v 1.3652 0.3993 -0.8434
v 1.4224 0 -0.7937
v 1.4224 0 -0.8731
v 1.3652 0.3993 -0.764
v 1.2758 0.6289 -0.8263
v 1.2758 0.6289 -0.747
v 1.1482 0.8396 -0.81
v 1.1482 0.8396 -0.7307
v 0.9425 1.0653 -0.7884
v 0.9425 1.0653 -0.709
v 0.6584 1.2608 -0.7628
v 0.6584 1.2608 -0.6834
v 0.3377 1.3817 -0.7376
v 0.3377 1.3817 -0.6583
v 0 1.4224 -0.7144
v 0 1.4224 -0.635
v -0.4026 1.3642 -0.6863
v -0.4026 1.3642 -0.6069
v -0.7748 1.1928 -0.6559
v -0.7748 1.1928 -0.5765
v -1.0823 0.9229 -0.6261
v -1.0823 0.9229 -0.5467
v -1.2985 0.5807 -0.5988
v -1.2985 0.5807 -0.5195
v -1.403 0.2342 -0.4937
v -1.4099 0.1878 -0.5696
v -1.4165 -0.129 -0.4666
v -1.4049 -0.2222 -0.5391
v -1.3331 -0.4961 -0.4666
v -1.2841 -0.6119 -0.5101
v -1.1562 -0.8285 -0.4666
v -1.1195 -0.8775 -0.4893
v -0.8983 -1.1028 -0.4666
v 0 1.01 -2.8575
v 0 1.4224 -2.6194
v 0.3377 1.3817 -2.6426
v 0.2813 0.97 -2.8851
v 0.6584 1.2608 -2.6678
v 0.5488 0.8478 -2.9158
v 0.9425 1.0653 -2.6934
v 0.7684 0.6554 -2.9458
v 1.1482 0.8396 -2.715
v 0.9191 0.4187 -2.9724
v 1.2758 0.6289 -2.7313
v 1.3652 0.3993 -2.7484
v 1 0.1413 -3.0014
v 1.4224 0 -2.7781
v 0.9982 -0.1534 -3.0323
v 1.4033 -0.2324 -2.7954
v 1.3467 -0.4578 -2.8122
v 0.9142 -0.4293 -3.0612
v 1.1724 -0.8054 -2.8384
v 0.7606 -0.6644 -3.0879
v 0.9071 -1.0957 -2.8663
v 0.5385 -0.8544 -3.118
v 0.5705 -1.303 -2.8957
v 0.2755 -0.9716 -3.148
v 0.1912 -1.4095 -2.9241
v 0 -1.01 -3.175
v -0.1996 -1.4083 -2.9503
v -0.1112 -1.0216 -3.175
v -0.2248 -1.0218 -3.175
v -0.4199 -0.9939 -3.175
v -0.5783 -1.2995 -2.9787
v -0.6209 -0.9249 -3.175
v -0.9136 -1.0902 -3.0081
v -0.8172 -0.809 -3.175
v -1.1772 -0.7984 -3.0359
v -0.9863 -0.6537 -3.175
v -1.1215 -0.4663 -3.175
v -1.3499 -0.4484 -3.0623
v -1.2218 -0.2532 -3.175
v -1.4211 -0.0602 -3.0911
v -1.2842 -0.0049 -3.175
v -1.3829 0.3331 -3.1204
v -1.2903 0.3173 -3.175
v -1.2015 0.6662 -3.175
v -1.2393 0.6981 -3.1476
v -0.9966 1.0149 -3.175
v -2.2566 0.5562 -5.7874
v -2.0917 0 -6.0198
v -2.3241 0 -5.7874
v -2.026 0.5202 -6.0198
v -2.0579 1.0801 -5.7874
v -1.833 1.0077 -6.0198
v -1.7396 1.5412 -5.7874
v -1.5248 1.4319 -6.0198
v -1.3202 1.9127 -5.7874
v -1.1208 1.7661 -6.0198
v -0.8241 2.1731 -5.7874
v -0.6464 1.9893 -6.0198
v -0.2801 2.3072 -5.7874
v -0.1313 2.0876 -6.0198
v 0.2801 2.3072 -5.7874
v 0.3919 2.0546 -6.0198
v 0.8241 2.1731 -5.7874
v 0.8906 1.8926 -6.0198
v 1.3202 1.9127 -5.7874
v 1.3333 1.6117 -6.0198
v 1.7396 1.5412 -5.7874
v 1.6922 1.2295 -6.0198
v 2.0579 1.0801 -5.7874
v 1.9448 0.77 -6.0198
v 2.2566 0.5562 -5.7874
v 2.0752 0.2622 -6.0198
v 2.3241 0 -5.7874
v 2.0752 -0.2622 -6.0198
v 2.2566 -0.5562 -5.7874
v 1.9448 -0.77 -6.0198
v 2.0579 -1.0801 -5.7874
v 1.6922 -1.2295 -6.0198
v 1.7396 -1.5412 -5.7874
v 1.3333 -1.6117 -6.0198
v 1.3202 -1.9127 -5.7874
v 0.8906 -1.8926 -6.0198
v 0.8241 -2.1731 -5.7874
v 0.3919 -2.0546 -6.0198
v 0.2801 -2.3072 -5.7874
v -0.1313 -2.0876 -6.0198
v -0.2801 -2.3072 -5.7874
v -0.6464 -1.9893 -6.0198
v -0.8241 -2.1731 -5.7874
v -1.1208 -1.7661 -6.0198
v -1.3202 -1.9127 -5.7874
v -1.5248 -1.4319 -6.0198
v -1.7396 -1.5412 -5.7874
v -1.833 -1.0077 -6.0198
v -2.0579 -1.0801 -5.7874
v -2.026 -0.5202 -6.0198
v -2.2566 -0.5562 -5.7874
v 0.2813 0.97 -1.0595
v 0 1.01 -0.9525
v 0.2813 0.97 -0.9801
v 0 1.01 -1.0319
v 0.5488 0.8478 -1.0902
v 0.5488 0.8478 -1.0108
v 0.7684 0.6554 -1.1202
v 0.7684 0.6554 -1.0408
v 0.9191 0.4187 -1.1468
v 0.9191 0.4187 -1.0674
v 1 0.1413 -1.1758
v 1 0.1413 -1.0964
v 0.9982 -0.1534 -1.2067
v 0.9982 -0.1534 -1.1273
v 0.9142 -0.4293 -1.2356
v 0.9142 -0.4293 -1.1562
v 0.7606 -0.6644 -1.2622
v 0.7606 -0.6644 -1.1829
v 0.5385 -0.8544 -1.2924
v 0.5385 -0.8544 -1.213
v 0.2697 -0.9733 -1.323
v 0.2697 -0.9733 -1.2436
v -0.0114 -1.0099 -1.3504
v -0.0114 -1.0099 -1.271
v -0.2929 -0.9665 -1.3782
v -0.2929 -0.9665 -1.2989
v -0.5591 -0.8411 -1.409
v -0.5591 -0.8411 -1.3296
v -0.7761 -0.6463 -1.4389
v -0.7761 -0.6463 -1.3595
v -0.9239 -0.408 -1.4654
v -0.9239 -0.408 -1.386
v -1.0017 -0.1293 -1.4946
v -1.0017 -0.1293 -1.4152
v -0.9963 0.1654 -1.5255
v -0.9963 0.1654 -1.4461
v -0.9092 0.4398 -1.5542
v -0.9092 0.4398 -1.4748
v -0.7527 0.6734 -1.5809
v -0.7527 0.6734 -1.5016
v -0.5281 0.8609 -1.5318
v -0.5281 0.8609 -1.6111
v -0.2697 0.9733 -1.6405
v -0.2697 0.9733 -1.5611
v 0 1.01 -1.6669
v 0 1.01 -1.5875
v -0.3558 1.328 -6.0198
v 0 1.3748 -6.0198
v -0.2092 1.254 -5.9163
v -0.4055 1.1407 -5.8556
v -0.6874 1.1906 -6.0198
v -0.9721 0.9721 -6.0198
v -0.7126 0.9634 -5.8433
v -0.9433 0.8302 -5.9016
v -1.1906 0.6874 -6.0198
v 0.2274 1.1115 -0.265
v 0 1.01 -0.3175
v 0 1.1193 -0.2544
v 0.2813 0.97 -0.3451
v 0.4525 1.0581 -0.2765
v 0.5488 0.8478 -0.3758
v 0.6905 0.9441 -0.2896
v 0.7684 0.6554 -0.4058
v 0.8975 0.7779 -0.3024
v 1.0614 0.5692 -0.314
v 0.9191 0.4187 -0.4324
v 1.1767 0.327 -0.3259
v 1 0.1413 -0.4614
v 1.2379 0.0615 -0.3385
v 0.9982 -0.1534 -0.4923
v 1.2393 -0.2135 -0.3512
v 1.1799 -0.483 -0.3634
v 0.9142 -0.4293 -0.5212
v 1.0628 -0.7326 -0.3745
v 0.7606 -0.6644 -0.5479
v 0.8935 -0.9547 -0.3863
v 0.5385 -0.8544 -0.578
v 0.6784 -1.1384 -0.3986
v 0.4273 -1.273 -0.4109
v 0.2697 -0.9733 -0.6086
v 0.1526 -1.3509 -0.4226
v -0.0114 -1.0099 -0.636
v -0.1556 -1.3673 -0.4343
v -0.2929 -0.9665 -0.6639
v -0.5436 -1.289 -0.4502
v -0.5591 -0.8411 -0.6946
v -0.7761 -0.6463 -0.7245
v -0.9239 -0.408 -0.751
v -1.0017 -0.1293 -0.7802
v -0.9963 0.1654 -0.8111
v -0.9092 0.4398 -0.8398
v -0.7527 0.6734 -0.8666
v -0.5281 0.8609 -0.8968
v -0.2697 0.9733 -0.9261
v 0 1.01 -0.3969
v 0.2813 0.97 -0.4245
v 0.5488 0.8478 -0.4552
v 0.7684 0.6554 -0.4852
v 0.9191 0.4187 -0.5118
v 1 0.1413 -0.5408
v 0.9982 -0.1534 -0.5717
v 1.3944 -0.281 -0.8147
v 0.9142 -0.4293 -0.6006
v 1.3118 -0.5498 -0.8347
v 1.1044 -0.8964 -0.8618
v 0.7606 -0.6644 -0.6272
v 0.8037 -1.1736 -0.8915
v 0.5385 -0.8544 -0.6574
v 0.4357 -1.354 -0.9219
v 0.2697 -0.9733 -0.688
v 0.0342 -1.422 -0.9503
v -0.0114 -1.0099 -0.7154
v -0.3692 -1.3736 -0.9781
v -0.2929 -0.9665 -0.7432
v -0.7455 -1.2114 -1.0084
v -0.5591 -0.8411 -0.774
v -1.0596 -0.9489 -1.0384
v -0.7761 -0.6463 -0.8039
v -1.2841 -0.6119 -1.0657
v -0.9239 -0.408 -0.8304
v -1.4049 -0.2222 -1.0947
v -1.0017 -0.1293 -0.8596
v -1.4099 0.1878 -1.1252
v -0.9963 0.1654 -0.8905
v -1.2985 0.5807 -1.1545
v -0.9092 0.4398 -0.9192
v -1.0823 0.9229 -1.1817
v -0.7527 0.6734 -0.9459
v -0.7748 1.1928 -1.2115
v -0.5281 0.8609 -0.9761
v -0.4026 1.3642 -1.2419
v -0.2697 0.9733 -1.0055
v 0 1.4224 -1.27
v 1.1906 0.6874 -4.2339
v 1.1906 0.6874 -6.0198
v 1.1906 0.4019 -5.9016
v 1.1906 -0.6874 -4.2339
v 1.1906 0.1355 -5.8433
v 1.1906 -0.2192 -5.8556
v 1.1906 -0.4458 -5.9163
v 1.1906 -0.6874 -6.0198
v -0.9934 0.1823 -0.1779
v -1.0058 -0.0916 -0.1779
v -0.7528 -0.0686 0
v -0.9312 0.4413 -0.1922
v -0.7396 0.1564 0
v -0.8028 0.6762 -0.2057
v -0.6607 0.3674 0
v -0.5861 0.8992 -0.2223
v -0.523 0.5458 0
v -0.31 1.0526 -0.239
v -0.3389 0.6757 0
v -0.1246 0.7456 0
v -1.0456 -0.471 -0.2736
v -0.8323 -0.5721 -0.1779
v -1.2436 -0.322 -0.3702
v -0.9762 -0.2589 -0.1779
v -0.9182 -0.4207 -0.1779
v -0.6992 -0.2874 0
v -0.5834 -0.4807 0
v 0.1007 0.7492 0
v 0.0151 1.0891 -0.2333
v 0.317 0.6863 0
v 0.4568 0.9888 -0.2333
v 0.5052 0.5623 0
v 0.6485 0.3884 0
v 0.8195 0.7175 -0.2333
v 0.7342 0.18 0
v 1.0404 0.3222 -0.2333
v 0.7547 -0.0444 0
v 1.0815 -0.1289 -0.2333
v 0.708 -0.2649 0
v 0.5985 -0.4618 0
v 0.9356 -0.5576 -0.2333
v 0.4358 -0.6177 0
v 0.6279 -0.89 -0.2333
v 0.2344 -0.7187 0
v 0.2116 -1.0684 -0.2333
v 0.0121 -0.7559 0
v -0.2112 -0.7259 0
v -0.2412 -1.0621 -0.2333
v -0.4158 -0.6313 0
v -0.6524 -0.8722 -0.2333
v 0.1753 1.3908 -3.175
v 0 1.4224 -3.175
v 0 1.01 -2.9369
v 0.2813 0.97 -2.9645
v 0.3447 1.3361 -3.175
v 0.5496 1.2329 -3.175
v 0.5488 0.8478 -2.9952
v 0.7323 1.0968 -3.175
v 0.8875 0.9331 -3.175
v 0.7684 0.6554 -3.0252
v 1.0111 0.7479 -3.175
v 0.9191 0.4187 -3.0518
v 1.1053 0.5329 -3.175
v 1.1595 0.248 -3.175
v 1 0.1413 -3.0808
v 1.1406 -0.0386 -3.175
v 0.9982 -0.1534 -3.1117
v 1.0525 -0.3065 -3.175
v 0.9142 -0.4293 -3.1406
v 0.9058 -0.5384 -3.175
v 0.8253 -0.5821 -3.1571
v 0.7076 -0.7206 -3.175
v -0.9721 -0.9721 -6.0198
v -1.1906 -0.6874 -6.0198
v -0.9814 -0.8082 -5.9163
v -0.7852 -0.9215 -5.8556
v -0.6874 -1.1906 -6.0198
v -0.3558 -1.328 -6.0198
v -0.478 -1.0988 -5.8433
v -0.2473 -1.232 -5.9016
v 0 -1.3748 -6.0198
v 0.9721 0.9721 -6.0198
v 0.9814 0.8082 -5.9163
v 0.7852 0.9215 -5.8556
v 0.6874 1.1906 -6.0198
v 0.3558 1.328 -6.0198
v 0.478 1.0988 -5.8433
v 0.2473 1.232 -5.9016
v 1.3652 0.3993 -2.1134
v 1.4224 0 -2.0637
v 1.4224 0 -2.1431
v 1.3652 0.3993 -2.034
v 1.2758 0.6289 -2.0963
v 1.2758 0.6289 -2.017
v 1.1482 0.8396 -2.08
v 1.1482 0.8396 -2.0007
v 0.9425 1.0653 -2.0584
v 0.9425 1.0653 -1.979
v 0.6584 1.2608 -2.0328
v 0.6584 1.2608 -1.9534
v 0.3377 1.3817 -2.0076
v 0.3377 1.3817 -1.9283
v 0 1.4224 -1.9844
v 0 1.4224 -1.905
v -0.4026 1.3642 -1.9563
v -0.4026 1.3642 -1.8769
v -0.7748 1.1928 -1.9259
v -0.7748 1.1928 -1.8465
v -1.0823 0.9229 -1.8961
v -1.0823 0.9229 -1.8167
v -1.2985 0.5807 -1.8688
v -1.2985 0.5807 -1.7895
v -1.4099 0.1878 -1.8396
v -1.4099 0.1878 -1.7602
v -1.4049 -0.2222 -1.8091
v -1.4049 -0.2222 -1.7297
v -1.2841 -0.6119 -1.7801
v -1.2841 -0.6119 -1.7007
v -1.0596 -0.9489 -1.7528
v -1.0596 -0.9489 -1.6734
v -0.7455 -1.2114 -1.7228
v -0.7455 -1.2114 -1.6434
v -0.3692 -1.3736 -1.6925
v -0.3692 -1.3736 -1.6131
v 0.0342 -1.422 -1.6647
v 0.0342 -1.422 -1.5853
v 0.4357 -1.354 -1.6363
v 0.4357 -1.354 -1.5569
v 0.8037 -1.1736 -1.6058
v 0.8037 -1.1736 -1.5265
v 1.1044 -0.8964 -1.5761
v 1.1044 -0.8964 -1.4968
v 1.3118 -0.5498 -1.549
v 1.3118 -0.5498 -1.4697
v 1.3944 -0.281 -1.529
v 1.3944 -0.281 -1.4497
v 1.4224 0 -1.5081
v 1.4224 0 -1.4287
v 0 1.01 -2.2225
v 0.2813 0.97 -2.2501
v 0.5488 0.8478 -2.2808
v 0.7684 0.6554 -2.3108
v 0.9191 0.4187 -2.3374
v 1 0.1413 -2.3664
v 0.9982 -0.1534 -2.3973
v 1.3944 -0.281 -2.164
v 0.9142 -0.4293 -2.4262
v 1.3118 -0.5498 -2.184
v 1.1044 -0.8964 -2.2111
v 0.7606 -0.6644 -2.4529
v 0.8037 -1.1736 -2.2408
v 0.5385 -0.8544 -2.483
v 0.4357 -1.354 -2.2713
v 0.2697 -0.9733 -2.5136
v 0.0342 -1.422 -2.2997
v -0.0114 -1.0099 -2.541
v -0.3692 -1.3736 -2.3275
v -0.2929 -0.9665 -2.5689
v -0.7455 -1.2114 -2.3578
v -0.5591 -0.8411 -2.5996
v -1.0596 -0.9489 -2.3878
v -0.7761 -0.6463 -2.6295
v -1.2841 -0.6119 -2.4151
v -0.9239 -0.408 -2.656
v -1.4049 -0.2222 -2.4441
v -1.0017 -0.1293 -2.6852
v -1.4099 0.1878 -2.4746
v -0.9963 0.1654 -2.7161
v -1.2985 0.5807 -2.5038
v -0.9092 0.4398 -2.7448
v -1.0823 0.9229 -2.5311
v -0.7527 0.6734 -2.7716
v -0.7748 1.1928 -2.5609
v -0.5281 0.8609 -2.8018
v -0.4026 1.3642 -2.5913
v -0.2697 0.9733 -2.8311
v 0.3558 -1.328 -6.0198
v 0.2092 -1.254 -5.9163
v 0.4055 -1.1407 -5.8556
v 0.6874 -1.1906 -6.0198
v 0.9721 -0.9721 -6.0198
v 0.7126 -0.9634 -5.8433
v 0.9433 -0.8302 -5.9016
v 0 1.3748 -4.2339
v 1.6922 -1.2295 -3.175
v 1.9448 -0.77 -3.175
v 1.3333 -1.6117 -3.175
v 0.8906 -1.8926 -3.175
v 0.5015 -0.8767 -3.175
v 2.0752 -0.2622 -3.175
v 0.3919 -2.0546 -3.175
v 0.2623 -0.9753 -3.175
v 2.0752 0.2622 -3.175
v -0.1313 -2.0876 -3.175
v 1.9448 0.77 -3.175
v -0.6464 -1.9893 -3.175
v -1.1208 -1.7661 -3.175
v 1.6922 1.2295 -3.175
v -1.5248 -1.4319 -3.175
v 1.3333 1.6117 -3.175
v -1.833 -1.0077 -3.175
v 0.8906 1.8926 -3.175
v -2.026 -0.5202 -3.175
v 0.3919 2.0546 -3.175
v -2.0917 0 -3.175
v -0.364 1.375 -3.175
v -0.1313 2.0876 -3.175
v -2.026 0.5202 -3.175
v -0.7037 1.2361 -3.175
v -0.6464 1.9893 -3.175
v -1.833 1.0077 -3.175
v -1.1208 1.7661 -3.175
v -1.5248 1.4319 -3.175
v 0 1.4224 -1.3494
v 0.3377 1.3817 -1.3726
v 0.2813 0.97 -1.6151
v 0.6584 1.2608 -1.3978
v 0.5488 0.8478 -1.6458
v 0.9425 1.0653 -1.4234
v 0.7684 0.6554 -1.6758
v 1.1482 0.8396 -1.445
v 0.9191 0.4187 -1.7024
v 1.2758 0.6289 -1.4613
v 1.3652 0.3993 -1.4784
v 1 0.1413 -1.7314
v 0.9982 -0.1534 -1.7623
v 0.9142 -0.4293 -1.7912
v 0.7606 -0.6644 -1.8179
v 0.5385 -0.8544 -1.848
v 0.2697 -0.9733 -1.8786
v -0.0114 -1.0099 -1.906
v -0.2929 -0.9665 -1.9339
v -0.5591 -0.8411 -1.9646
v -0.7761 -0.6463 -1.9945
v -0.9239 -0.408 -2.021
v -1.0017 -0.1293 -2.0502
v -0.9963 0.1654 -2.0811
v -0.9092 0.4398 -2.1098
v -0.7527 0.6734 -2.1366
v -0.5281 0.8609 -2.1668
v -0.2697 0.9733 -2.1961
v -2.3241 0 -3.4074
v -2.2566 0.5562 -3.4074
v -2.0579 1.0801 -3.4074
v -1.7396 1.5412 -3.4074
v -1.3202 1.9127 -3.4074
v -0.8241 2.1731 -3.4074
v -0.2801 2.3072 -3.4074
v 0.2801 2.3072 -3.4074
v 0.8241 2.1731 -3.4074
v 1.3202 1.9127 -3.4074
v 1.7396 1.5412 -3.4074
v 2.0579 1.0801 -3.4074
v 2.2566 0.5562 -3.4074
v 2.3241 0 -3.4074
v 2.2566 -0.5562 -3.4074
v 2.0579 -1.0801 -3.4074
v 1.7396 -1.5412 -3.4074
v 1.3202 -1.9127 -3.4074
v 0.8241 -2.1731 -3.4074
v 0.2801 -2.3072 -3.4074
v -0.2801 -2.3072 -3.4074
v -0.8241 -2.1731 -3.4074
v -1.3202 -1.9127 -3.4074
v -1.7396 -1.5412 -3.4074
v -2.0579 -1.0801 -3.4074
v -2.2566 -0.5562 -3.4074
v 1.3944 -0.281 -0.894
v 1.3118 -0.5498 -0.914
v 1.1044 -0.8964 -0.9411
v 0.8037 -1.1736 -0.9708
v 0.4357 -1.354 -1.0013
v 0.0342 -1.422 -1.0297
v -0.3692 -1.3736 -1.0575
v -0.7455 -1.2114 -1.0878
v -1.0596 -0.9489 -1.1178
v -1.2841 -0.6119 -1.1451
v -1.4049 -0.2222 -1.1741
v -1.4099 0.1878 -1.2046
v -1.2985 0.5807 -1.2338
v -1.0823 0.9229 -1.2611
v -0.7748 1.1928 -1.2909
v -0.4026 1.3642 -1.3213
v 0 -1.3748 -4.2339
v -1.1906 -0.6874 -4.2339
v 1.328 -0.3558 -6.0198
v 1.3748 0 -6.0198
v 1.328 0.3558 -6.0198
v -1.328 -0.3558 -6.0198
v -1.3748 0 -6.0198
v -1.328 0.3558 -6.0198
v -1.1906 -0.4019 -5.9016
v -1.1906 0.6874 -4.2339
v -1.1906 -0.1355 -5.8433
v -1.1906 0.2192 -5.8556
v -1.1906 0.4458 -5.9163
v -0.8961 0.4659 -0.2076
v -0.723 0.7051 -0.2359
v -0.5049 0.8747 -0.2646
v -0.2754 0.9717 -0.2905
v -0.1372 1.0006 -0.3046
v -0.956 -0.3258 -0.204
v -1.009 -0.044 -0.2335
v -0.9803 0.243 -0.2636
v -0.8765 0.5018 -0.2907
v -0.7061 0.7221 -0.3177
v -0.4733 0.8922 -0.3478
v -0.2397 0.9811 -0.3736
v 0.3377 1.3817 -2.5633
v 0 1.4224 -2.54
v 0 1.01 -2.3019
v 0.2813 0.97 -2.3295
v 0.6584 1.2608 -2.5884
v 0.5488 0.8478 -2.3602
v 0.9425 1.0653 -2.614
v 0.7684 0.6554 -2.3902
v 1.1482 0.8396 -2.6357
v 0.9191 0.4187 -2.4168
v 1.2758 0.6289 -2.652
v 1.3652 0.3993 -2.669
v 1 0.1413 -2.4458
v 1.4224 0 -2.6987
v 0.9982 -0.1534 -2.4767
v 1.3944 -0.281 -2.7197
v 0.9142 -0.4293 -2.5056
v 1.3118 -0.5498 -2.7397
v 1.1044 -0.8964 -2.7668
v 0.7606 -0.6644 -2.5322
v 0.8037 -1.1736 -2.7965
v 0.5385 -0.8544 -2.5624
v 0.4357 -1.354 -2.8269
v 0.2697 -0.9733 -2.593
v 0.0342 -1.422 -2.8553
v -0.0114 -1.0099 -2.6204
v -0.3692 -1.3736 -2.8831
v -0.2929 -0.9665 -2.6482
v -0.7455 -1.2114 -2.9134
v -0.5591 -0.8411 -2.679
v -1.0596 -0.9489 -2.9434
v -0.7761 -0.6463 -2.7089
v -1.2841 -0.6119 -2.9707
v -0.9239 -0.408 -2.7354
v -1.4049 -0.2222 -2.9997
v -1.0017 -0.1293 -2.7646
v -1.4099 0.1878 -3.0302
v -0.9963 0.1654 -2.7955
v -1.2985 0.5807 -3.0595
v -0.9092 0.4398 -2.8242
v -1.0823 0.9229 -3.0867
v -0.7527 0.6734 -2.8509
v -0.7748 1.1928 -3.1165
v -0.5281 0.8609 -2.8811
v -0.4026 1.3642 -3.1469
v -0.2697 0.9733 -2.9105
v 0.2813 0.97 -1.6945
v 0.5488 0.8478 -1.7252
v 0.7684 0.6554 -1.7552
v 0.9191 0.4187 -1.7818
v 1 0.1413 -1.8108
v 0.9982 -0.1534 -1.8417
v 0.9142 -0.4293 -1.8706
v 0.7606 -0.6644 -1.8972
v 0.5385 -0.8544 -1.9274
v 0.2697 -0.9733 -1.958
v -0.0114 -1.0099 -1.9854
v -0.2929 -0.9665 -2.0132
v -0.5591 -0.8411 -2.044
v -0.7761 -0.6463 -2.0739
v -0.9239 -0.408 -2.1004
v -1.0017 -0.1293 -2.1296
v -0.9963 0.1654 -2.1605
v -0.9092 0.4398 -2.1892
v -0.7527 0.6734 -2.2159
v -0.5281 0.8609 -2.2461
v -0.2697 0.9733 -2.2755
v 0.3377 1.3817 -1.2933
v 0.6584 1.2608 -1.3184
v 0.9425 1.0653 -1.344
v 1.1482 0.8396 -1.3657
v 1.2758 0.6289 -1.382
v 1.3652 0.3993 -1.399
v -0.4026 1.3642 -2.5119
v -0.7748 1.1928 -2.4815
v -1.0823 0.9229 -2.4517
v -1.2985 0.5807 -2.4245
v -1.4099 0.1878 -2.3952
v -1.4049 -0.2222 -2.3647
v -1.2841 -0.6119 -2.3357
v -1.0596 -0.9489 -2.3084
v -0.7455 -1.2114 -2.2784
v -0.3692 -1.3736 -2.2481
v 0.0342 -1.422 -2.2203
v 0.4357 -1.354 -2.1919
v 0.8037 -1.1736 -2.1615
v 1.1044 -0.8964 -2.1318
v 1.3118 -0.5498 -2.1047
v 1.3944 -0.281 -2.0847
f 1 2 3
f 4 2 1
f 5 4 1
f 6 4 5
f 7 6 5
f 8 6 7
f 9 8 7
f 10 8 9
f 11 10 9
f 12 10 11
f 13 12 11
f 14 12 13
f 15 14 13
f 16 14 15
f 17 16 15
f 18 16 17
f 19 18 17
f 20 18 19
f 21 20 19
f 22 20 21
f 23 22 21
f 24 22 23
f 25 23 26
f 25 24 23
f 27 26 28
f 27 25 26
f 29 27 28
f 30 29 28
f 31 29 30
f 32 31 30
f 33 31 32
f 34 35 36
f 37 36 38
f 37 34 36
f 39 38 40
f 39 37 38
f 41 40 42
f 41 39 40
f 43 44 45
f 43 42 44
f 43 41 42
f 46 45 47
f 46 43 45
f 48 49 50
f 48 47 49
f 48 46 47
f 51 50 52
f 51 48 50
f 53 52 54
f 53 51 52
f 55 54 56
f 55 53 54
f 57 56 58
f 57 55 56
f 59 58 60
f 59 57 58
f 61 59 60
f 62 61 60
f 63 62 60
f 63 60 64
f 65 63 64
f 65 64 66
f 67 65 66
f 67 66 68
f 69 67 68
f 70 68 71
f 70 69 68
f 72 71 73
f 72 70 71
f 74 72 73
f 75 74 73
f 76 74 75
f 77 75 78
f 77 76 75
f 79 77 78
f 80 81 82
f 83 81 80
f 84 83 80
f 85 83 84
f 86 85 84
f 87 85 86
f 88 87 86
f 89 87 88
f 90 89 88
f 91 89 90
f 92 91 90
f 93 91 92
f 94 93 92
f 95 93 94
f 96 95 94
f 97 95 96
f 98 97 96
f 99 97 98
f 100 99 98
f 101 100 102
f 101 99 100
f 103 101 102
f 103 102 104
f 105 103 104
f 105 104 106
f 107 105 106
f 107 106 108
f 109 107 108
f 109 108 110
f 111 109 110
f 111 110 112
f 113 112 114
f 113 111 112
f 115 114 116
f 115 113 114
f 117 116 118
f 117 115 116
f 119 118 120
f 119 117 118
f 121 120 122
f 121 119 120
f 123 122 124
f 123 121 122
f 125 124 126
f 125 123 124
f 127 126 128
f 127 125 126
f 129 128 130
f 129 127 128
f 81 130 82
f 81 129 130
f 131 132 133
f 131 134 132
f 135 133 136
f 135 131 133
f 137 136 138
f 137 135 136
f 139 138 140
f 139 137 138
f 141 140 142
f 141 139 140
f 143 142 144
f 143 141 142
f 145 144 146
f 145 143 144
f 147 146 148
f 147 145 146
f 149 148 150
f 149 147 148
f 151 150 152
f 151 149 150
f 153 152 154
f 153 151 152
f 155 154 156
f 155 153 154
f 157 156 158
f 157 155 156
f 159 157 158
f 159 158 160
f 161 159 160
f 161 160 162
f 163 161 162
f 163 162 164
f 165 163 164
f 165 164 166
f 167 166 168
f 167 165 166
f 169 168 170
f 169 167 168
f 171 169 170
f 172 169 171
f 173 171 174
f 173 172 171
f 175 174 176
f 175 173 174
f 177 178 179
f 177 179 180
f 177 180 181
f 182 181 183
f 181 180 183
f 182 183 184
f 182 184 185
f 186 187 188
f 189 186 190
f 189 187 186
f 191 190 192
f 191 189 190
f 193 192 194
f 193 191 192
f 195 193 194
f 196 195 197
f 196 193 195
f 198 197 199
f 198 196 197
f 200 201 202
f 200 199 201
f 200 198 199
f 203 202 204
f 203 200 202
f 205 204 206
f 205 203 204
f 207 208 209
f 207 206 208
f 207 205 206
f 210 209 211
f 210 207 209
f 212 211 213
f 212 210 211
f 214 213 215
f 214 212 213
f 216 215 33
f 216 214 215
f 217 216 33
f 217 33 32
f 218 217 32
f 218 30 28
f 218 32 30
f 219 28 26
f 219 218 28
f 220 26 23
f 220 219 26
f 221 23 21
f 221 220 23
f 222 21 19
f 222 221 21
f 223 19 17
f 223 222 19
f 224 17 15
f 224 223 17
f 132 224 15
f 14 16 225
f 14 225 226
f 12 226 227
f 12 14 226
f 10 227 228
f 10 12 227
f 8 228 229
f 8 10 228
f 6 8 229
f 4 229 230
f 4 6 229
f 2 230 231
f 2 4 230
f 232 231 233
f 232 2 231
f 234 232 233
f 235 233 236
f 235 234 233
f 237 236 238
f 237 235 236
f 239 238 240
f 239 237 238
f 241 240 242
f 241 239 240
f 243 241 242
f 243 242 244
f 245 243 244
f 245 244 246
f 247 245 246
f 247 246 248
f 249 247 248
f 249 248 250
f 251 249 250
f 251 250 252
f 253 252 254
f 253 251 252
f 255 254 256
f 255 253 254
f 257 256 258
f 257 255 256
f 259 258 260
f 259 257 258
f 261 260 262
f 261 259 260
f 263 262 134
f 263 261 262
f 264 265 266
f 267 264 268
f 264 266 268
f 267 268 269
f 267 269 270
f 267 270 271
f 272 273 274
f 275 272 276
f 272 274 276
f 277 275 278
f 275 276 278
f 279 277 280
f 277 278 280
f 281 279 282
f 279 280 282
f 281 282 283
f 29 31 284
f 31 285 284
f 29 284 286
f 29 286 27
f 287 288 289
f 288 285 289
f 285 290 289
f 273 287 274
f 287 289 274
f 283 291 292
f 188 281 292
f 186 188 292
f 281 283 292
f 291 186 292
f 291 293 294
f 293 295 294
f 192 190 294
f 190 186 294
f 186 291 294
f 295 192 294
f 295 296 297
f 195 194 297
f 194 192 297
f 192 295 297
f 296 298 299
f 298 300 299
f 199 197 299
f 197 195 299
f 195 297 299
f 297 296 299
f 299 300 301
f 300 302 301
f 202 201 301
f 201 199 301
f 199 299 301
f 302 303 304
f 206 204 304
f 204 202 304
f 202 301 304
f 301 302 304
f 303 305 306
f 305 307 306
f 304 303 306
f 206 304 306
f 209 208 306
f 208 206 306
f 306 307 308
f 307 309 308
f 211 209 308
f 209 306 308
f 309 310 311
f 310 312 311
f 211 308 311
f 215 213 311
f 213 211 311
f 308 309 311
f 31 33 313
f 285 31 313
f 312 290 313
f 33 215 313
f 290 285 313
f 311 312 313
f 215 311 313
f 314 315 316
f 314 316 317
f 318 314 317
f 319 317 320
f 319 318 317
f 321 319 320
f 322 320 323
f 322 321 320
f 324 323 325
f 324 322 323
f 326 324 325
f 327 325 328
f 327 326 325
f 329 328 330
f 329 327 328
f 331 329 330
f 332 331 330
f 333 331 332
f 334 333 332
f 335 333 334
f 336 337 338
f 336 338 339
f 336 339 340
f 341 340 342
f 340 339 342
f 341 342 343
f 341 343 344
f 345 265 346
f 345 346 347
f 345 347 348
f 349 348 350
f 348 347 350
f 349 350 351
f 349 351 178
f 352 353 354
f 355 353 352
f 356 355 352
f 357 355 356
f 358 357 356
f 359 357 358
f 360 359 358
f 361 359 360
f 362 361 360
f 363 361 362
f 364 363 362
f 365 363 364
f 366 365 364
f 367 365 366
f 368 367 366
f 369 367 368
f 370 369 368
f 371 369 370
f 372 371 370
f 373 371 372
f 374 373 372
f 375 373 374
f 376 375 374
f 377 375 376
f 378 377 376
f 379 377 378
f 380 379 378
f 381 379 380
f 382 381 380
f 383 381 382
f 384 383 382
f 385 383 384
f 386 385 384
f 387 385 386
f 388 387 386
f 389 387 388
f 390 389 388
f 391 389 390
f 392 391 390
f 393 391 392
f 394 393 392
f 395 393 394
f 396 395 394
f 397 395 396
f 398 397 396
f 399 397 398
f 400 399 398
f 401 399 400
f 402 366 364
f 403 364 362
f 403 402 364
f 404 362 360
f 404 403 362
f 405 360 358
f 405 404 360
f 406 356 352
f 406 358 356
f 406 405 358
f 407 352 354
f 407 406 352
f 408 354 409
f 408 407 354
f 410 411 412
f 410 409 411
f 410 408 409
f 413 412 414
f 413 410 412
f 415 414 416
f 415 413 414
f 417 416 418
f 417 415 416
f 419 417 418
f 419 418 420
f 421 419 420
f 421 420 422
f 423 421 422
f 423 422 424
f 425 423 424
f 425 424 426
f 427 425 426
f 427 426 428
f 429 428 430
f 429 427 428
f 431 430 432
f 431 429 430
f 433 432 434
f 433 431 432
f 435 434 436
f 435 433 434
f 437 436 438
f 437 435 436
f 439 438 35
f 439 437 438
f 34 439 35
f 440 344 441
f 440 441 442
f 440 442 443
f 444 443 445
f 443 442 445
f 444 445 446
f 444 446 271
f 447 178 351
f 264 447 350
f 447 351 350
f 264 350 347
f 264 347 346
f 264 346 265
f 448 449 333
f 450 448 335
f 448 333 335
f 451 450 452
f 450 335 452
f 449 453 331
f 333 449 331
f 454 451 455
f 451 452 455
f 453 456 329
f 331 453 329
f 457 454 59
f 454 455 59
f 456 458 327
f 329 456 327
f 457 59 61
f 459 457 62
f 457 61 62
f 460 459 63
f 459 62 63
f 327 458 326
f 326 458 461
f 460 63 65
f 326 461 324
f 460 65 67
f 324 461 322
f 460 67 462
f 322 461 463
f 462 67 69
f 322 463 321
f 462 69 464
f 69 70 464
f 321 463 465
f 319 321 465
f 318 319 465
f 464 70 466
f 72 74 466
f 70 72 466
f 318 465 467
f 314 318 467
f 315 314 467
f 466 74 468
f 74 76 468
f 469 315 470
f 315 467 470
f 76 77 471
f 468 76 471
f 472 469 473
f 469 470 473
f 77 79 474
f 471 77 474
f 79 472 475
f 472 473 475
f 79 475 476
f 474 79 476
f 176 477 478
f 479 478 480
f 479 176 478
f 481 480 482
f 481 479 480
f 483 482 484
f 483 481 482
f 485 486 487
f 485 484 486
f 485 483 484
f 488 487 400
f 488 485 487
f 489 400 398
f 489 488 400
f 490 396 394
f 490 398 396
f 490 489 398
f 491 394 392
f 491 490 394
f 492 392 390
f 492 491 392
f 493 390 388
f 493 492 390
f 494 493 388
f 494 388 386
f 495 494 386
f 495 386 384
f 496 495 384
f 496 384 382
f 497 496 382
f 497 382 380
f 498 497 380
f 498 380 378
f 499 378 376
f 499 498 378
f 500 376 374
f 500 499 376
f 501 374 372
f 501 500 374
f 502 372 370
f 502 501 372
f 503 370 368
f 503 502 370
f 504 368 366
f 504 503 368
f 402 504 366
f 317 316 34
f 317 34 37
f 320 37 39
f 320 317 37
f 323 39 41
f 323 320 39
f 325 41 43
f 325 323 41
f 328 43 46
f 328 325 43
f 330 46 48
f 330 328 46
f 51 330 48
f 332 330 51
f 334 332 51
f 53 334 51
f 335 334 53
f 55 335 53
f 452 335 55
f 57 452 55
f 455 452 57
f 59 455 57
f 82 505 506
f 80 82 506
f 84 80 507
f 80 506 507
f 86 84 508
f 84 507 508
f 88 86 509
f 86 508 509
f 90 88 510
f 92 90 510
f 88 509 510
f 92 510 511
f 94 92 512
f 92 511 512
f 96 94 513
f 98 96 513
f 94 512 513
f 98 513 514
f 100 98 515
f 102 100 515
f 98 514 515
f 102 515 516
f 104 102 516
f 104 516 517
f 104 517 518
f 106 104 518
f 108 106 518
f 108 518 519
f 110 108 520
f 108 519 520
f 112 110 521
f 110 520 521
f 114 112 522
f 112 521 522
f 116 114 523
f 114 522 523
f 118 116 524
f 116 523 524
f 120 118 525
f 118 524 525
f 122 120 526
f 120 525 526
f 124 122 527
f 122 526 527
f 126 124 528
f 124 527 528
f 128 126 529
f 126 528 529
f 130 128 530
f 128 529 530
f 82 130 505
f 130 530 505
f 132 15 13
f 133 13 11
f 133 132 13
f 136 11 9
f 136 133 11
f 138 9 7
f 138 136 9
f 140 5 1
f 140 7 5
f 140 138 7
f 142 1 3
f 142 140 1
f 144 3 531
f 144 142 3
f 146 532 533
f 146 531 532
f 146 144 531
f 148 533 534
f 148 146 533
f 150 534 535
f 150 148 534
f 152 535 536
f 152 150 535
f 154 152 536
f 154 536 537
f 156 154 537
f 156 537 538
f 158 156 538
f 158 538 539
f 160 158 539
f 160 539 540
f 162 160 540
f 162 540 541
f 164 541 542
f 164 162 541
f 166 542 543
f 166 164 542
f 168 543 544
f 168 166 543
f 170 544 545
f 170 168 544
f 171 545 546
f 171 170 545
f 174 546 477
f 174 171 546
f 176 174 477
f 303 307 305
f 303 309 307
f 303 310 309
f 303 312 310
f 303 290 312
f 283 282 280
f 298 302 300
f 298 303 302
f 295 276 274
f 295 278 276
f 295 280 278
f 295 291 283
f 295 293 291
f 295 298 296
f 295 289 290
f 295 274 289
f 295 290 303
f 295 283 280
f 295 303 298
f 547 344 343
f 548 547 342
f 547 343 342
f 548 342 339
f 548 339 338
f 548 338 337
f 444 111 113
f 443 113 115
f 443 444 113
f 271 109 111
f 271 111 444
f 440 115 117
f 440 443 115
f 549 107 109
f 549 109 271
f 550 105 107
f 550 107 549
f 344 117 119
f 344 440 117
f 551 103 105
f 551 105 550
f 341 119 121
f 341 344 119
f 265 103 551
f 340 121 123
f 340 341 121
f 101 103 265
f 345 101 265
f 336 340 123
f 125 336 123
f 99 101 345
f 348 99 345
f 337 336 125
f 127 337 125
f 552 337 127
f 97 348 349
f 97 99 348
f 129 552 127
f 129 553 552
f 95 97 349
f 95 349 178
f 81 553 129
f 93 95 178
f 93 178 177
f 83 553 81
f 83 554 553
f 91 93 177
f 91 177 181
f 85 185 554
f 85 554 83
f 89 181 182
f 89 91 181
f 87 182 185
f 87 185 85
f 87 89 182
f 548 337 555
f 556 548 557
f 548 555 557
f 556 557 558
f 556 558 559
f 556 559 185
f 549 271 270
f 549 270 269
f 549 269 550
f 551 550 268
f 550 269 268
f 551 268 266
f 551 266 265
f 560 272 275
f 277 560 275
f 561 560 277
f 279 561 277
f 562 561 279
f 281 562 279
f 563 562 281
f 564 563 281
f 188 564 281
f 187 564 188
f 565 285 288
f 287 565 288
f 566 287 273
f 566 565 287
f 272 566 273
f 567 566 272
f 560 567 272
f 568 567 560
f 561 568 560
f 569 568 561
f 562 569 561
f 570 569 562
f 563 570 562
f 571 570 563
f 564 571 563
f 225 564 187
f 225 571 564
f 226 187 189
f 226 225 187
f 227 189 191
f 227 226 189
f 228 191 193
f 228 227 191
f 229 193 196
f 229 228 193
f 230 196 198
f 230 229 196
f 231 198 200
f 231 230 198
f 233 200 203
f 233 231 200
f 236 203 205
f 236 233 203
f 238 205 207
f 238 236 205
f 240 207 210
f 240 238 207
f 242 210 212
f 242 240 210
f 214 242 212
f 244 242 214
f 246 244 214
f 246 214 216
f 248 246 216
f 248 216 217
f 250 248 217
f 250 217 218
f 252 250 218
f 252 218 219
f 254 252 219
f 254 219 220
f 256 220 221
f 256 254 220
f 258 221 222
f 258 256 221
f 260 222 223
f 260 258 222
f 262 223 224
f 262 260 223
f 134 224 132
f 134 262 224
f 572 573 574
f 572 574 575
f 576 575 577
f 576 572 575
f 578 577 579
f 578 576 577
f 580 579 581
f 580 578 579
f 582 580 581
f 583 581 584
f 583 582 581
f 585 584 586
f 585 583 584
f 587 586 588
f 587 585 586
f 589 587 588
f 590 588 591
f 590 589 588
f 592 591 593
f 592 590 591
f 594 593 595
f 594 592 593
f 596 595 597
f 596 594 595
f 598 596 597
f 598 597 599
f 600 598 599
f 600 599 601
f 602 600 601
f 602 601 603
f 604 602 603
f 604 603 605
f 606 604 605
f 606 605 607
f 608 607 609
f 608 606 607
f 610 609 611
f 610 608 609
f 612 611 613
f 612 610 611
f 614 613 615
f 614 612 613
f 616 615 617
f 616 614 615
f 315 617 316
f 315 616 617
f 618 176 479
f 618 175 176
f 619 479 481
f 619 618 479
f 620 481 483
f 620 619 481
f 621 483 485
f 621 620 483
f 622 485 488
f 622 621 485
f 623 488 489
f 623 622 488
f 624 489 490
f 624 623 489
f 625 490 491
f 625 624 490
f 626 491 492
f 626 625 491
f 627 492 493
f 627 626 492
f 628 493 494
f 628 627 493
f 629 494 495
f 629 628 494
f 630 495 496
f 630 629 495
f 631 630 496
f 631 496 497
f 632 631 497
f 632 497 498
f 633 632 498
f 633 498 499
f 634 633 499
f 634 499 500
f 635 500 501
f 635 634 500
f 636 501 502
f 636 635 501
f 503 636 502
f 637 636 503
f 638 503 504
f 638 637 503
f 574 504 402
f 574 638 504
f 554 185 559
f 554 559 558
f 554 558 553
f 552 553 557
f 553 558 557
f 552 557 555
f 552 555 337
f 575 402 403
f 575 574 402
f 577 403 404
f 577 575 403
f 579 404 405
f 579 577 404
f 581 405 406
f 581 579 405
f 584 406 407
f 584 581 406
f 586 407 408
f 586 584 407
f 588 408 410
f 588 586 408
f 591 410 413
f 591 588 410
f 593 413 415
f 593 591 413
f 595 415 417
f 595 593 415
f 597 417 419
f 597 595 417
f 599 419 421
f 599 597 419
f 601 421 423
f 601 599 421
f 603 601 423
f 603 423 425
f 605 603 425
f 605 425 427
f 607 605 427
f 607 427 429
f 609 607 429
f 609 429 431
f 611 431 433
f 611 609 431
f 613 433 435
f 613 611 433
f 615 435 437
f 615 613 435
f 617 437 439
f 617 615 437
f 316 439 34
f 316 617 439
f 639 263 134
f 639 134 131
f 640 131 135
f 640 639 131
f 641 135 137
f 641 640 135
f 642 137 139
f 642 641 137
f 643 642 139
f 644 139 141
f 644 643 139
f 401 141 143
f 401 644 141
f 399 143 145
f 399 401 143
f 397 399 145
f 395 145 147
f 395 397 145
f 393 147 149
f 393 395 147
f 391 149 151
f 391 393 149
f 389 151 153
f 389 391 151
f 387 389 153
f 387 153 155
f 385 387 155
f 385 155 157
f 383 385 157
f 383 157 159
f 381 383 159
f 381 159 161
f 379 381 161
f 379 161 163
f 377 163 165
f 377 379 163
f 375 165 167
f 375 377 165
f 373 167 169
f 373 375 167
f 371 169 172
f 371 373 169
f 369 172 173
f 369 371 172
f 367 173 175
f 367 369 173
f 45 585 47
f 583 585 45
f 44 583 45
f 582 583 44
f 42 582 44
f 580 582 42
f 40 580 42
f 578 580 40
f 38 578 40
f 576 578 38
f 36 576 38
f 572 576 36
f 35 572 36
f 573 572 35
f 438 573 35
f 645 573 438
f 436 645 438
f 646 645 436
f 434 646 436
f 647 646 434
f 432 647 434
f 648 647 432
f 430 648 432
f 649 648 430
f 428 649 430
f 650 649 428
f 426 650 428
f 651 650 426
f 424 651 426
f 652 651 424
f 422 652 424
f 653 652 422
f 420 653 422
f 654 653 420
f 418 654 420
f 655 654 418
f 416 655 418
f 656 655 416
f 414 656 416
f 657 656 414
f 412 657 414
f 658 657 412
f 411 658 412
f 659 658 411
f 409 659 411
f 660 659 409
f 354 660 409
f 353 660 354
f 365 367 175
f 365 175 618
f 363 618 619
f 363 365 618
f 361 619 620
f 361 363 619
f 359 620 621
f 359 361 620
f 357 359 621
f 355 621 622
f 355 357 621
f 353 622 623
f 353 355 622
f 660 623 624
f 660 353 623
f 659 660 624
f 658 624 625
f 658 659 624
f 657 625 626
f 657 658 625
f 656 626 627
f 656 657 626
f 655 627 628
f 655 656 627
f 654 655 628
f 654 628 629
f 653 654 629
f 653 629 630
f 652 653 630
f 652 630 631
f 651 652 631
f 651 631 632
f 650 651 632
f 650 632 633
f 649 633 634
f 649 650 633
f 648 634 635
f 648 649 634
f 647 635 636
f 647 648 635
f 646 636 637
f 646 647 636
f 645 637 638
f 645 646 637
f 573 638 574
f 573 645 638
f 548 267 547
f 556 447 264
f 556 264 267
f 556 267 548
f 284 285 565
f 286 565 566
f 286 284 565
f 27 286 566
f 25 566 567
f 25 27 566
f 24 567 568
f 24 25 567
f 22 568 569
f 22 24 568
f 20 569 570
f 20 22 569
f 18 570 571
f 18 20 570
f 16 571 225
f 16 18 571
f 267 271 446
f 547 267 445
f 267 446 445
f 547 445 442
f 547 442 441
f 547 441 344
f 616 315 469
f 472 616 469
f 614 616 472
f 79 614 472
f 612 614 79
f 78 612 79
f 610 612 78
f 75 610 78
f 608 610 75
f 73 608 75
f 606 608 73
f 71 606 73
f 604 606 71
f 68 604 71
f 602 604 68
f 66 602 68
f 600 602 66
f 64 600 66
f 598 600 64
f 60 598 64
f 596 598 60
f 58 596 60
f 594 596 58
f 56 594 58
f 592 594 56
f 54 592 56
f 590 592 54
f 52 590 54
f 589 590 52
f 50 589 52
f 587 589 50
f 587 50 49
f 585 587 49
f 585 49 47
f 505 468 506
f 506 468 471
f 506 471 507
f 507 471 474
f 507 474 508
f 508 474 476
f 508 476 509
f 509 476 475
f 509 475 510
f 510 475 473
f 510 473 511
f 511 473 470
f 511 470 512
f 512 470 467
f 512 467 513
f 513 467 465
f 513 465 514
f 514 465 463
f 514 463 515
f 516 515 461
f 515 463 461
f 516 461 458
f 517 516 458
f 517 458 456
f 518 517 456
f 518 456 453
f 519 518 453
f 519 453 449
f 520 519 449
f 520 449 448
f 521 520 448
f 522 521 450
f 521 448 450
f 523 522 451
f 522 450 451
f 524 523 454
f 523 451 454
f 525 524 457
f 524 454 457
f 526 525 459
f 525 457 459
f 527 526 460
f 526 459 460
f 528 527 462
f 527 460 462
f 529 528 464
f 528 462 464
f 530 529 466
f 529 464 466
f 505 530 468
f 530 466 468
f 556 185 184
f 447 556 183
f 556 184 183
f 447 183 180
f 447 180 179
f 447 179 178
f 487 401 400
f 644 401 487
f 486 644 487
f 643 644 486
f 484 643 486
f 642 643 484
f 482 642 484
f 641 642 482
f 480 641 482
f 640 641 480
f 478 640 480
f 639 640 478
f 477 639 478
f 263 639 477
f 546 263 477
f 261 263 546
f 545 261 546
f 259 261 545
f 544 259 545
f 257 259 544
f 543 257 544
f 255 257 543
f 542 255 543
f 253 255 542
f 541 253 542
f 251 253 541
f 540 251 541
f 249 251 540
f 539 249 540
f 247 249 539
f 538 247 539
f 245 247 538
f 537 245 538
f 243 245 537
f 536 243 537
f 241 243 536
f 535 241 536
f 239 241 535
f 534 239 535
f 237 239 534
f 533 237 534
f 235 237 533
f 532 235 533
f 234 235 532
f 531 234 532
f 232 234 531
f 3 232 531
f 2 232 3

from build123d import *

# Parameters (mm, degrees)
SKETCH1_R          = 1.4224
EXTRUDE1_DEPTH     = 3.175
CUT_SWEEP1_PITCH   = 0.635
SKETCH6_R          = 2.3241
EXTRUDE2_DEPTH     = 2.8448
CUT_EXTRUDE1_DEPTH = 1.7859375
CHAMFER1_SIZE      = 0.23241


with BuildPart() as part:
    # Sketch1 → Extrude1 (new body)
    with BuildSketch(Plane.XY):
        Circle(SKETCH1_R)
    extrude(amount=-EXTRUDE1_DEPTH)

    # Cut-Sweep1: the profile of Sketch3 profile screwed along a right-hand helix of 6 turns, 6 arcs to a turn; built about Z, then put on its axis
    cut_sweep1_z = Axis((0, 0, 0), (0, 0, 1))
    cut_sweep1_corners = [(1.4227, 0, -0.555798205), (1.009955401, 0, -0.3175), (1.009955401, 0, -0.238125), (1.4227, 0, 0.000173205)]
    with BuildLine(mode=Mode.PRIVATE) as cut_sweep1_profile:
        Line(cut_sweep1_corners[0], cut_sweep1_corners[1])
        Line(cut_sweep1_corners[1], cut_sweep1_corners[2])
        Line(cut_sweep1_corners[2], cut_sweep1_corners[3])
        Line(cut_sweep1_corners[3], cut_sweep1_corners[0])
    cut_sweep1_cap = Face(cut_sweep1_profile.wire())
    cut_sweep1_turn_angles = [0, 30, 60, 90, 120, 150, 180, 210, 240, 270, 300, 330, 360]
    cut_sweep1_turn_weights = [1, 0.8660254037844387, 1, 0.8660254037844387, 1, 0.8660254037844387, 1, 0.8660254037844387, 1, 0.8660254037844387, 1, 0.8660254037844387, 1]
    cut_sweep1_turn_rails = [Edge.make_bspline([Vector(p[0], p[1], 0).rotate(cut_sweep1_z, cut_sweep1_turn_angles[k]) / cut_sweep1_turn_weights[k] + Vector(0, 0, p[2] + CUT_SWEEP1_PITCH * cut_sweep1_turn_angles[k] / 360) for k in range(13)], [0, 0, 0, 1, 1, 2, 2, 3, 3, 4, 4, 5, 5, 6, 6, 6], 2, cut_sweep1_turn_weights) for p in cut_sweep1_corners]
    cut_sweep1_turn_sides = [Face.make_surface_from_curves(cut_sweep1_turn_rails[p[0]], cut_sweep1_turn_rails[p[1]]) for p in [(0, 1), (1, 2), (2, 3), (3, 0)]]
    cut_sweep1 = Plane(origin=(0, 0, 0), x_dir=(0, 1, 0), z_dir=(0, 0, -1)) * Solid(Shell([*[p.moved(Location((0, 0, CUT_SWEEP1_PITCH * i))) for i in range(6) for p in cut_sweep1_turn_sides], cut_sweep1_cap, cut_sweep1_cap.rotate(cut_sweep1_z, 2160).moved(Location((0, 0, CUT_SWEEP1_PITCH * 2160 / 360)))]))
    add(cut_sweep1, mode=Mode.SUBTRACT)

    # Sketch4 → Cut-Revolve1 (revolve, cut)
    with BuildSketch(Plane(origin=(0, 0, 0), x_dir=(0, 0, -1), z_dir=(1, 0, 0)), mode=Mode.PRIVATE) as cut_revolve1_sk:
        Polygon((0.466649532, 1.4224), (0, 0.755955401), (0, 1.4224), align=None)
    revolve(cut_revolve1_sk.sketch.rotate(Axis((0, 0, 0), (0, 0, -1)), 264.795368264), axis=Axis((0, 0, 0), (0, 0, -1)), mode=Mode.SUBTRACT)

    # Sketch6 → Extrude2 (add)
    with BuildSketch(Plane(origin=(0, 0, -3.175), x_dir=(-1, 0, 0), z_dir=(0, 0, -1))):
        Circle(SKETCH6_R)
    extrude(amount=EXTRUDE2_DEPTH)

    # Sketch7 → Cut-Extrude1 (cut)
    with BuildSketch(Plane(origin=(0, 0, -6.0198), x_dir=(-1, 0, 0), z_dir=(0, 0, -1))):
        Polygon((0, 1.374815329), (-1.190625, 0.687407664), (-1.190625, -0.687407664), (0, -1.374815329), (1.190625, -0.687407664), (1.190625, 0.687407664), align=None)
    extrude(amount=-CUT_EXTRUDE1_DEPTH, mode=Mode.SUBTRACT)

    # Cut-Extrude2 cone 1 section (through the dimple's axis) → Cut-Extrude2 (revolve, cut)
    with BuildSketch(Plane(origin=(0, 0, -6.0198), x_dir=(0, 1, 0), z_dir=(1, 0, 0))):
        Polygon((0, 0), (1.374815329, 0), (0, 1.374815329), align=None)
    revolve(axis=Axis((0, 0, -6.0198), (0, 0, 1)), mode=Mode.SUBTRACT)

    # Chamfer1
    chamfer1_edges = [part.edges().sort_by_distance(p)[0] for p in [
        (2.3241, 0, -3.175),
        (2.3241, 0, -6.0198),
    ]]
    chamfer(chamfer1_edges, length=CHAMFER1_SIZE)


solid = part.part
